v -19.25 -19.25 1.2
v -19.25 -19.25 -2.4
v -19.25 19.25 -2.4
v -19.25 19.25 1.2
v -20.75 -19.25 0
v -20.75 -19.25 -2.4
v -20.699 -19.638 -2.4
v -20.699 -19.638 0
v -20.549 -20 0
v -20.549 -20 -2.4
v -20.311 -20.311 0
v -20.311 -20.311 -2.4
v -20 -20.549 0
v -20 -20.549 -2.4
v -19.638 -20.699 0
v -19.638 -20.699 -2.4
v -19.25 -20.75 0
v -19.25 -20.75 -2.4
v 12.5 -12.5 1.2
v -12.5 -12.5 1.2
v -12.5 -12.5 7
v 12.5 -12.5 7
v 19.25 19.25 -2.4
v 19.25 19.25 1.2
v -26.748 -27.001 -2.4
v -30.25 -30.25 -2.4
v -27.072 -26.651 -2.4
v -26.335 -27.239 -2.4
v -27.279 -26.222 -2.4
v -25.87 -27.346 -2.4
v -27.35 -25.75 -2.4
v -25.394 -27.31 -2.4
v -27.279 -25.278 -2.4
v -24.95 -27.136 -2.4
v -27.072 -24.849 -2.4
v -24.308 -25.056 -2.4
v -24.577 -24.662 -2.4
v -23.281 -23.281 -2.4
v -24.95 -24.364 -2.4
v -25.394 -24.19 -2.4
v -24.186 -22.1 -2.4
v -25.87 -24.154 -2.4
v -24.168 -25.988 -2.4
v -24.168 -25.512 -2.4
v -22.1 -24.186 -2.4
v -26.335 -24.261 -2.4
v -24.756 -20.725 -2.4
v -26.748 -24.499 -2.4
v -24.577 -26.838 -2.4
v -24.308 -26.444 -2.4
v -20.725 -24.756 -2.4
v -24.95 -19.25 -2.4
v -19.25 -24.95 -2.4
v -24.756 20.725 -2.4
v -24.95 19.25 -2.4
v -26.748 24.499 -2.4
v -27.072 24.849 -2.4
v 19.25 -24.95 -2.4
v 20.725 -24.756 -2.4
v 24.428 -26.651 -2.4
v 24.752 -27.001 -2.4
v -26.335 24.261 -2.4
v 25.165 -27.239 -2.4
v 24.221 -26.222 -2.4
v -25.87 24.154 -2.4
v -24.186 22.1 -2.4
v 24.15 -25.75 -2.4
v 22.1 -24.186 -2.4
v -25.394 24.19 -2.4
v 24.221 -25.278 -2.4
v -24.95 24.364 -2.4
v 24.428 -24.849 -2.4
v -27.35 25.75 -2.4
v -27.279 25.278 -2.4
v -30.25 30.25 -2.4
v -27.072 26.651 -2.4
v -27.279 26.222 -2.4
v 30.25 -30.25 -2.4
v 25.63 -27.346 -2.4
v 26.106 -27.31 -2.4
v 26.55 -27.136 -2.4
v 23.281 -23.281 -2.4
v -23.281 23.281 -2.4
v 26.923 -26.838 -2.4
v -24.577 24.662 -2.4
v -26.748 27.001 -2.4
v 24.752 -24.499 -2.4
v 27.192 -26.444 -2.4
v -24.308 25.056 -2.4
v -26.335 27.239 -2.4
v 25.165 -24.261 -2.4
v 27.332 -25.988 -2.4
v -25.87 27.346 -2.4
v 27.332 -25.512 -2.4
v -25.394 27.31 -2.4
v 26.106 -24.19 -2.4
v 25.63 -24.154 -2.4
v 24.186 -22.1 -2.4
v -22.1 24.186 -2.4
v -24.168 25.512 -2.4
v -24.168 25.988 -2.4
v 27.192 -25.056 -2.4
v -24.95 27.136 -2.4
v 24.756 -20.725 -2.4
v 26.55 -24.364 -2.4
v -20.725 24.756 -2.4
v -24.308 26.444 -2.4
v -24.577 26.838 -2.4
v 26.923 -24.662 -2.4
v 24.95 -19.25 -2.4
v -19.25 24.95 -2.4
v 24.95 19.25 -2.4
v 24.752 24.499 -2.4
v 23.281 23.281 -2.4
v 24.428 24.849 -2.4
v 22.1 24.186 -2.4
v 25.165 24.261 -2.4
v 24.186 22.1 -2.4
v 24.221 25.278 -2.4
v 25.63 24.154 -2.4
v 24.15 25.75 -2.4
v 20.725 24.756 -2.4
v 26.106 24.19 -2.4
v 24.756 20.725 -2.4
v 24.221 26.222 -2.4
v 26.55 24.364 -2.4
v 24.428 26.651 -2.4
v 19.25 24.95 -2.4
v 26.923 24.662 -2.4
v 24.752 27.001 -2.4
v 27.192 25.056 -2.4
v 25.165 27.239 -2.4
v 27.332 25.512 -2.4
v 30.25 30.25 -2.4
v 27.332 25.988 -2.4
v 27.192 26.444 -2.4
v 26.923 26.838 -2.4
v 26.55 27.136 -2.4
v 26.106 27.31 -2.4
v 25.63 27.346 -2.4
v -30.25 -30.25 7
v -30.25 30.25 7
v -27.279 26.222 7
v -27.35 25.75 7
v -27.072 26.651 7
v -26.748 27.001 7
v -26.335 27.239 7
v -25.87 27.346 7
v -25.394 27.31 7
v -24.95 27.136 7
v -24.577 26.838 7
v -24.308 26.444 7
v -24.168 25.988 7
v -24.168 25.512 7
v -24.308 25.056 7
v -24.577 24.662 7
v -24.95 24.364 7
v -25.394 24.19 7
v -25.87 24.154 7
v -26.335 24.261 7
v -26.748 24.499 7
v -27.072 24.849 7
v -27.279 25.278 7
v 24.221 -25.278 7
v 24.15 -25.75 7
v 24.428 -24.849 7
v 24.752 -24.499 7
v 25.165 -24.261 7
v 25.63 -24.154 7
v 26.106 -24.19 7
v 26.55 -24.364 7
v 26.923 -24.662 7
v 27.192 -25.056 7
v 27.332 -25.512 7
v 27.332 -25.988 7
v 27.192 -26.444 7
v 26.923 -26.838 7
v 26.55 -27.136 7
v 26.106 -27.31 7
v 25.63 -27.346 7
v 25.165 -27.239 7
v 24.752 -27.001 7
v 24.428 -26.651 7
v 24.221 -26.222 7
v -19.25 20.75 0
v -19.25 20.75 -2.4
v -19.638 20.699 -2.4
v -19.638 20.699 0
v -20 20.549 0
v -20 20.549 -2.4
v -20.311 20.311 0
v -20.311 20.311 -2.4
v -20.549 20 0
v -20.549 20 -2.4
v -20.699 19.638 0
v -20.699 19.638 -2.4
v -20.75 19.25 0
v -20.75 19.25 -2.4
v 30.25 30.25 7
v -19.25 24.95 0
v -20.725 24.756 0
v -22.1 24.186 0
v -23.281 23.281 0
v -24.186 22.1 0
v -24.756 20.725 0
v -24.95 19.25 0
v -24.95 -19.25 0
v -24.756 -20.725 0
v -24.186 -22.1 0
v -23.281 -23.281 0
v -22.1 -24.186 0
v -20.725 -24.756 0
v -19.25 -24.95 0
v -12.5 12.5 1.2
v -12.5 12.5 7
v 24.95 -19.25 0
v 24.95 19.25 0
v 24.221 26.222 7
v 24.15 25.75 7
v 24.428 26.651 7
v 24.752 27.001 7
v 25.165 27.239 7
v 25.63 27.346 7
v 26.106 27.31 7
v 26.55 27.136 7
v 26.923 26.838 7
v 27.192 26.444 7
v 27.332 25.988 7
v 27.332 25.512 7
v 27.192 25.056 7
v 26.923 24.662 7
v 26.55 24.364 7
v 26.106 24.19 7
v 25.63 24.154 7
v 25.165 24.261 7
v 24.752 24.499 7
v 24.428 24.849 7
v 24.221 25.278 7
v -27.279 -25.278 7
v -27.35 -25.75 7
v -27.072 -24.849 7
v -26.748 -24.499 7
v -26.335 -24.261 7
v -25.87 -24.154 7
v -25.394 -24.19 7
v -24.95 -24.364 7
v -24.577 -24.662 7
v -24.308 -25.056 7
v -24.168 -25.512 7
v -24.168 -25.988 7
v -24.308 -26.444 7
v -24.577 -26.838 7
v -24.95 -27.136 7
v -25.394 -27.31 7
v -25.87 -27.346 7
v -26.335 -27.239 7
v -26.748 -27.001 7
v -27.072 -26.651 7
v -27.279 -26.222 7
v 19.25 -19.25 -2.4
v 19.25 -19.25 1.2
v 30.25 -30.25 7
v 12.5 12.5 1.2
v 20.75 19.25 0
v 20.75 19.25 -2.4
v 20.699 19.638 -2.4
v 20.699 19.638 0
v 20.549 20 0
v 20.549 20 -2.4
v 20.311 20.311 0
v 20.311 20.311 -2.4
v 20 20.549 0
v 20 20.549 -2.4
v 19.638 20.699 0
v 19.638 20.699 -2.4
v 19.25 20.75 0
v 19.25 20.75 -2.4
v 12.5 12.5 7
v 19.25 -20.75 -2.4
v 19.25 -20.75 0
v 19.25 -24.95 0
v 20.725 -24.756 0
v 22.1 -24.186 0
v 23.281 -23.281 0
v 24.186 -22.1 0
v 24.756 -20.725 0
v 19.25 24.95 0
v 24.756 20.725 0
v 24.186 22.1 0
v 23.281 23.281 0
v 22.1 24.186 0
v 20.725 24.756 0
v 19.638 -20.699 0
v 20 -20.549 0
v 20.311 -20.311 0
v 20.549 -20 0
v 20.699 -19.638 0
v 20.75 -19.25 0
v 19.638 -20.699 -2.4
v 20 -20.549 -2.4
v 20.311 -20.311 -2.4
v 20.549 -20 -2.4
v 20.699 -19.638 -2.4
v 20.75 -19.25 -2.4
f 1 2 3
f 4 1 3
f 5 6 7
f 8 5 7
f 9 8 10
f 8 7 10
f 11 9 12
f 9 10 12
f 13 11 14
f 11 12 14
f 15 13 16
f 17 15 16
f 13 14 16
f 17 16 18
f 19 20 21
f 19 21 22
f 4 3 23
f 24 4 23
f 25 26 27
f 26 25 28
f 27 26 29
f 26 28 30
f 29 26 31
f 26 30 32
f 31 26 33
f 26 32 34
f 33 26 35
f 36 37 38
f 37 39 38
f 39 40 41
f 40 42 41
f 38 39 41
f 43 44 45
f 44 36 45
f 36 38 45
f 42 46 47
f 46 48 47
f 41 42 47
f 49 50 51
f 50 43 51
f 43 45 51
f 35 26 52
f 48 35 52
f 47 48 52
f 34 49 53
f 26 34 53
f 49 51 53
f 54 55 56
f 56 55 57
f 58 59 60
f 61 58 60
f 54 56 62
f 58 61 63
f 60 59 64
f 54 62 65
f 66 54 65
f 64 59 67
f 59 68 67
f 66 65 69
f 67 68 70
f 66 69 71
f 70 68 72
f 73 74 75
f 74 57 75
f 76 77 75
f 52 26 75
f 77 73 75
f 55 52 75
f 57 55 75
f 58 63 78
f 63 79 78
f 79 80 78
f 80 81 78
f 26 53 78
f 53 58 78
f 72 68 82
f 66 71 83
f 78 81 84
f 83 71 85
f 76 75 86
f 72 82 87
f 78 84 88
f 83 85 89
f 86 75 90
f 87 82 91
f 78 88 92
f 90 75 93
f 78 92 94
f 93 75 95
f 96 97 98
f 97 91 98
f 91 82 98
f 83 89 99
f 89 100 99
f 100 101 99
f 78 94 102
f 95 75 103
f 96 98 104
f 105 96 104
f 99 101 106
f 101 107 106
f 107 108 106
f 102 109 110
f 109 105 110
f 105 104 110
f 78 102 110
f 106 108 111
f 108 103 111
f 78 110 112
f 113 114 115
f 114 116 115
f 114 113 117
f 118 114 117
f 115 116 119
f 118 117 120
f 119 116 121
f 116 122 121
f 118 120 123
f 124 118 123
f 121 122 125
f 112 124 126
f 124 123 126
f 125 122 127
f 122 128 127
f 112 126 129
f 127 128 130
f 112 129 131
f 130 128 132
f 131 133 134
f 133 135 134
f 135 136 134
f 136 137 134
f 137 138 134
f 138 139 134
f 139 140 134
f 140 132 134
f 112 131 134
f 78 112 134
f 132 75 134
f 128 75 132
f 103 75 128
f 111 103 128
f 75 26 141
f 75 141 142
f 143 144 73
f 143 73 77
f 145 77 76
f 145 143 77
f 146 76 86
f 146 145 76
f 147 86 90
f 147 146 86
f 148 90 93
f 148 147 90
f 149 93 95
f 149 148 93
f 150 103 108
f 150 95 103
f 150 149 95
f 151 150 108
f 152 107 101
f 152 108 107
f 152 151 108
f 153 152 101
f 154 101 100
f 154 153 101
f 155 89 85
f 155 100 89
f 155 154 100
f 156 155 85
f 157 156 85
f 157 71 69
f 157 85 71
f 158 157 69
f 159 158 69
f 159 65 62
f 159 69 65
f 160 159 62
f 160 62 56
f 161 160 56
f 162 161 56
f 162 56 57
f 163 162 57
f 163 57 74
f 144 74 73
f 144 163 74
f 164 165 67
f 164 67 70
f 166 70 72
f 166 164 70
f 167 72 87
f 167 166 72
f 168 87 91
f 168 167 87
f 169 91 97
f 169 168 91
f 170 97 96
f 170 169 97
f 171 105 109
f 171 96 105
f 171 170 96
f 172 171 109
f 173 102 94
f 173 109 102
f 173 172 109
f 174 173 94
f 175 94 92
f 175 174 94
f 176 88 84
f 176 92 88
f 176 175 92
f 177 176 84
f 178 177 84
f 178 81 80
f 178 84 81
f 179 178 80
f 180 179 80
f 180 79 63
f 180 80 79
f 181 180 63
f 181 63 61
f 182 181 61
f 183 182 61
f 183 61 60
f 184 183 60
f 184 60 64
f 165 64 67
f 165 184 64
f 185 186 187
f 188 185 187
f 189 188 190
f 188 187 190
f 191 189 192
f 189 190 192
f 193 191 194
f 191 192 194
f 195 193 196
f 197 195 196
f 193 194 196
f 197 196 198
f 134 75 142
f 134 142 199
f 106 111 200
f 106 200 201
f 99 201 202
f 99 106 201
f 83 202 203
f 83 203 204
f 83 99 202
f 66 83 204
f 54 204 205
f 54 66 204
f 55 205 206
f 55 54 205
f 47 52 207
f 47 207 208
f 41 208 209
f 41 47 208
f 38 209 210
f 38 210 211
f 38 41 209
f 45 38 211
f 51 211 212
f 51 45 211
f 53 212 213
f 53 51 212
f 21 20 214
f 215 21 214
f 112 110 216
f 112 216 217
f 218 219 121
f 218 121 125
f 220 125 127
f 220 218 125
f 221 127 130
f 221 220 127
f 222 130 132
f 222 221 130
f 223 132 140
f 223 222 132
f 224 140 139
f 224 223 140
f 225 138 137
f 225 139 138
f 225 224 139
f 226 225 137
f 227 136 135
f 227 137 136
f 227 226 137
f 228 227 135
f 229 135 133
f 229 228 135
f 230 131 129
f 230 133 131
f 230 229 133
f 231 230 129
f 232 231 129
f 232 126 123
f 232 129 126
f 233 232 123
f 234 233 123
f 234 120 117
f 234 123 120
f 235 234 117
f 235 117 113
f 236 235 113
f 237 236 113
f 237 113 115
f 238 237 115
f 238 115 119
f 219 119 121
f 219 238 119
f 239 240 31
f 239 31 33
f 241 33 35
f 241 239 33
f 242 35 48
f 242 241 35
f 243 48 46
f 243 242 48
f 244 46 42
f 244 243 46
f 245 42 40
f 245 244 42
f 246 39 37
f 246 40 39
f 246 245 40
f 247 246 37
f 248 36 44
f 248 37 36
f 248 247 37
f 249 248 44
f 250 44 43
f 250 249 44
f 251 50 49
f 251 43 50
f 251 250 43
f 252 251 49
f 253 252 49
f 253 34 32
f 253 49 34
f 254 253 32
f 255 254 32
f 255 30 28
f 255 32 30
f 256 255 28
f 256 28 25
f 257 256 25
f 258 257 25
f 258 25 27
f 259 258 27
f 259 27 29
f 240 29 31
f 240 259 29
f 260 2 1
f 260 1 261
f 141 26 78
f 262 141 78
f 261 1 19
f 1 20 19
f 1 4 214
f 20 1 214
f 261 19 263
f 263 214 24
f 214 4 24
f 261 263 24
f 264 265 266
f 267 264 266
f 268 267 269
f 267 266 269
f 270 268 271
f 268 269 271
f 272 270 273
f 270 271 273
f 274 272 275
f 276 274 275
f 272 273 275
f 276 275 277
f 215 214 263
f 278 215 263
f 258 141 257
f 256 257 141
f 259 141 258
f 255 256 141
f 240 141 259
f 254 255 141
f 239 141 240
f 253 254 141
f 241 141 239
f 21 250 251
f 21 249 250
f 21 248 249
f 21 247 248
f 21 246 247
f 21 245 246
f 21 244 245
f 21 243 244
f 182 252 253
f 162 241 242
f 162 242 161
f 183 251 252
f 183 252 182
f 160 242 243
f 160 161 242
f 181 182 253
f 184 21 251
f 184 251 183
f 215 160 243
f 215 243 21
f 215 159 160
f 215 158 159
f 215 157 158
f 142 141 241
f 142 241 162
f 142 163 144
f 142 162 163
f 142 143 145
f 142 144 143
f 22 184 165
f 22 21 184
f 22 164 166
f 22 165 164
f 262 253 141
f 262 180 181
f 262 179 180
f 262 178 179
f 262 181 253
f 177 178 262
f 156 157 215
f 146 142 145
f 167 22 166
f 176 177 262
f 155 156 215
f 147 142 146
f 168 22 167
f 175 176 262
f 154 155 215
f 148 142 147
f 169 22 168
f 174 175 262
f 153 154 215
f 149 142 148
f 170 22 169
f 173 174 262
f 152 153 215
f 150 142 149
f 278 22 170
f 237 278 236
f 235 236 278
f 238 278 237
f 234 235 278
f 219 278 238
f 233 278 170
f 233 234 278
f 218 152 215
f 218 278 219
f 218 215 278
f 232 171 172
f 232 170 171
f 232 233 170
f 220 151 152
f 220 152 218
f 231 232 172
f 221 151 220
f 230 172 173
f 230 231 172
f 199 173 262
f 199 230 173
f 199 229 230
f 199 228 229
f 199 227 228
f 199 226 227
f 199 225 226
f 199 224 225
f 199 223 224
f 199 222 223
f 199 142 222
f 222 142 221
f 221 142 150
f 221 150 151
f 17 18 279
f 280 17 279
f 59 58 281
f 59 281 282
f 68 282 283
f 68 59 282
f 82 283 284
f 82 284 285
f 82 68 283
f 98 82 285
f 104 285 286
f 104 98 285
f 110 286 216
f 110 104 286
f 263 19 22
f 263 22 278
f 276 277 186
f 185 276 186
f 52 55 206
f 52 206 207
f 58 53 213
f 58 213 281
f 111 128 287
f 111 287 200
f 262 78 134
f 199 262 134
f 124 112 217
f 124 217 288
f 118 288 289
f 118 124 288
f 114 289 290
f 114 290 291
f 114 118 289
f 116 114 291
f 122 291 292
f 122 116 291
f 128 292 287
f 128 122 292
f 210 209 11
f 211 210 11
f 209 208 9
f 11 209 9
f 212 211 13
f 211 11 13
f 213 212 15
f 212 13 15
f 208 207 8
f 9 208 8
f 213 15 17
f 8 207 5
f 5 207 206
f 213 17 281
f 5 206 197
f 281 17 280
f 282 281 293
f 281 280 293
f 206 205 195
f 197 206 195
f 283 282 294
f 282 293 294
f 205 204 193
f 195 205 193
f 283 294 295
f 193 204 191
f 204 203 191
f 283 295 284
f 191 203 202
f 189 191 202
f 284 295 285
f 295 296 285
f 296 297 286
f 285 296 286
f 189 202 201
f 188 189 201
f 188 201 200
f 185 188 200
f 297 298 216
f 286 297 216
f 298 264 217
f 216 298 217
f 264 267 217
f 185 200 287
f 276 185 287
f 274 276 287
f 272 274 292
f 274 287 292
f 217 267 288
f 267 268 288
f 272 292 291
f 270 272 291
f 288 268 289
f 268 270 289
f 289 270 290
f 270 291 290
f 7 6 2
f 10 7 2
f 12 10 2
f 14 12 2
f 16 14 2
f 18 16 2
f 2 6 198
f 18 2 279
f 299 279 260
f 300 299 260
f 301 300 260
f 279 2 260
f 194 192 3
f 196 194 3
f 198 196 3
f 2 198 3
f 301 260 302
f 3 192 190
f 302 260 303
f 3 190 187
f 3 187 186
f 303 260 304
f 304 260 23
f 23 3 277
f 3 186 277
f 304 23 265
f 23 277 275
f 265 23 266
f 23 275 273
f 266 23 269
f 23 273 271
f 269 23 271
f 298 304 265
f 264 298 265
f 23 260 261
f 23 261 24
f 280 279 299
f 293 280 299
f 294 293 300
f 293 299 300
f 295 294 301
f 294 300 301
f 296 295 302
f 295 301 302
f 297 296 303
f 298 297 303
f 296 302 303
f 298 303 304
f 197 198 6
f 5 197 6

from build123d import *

# Parameters (mm, degrees)
EXTRUDE_1_DEPTH          = 7
EXTRUDE_1_DEPTH_BACK     = 2.4
SKETCH_1_W               = 60.5
SKETCH_1_H               = 60.5
SKETCH_1_W_2             = 38.5
SKETCH_1_H_2             = 38.5
SKETCH_2_W               = 38.5
SKETCH_2_H               = 38.5
SKETCH_2_W_2             = 25
SKETCH_2_H_2             = 25
EXTRUDE_3_DEPTH          = 5.8
CUT_EXTRUDE_1_DEPTH      = 2.4
CUT_EXTRUDE_2_DEPTH      = 44.800513696
CUT_EXTRUDE_2_DEPTH_BACK = 44.800513696
SKETCH_5_R               = 1.6


with BuildPart() as part:
    # ｽｹｯﾁ1 → ﾎﾞｽ - 押し出し1 (new, two sides: drawn at the far end of the back side and taken through both)
    with BuildSketch(Plane.XY.offset(-EXTRUDE_1_DEPTH_BACK)):
        Rectangle(SKETCH_1_W, SKETCH_1_H)
        Rectangle(SKETCH_1_W_2, SKETCH_1_H_2, mode=Mode.SUBTRACT)
    extrude(amount=EXTRUDE_1_DEPTH + EXTRUDE_1_DEPTH_BACK)

    # ｽｹｯﾁ2 → ﾎﾞｽ - 押し出し3 (add)
    with BuildSketch(Plane.XY.offset(1.2)):
        Rectangle(SKETCH_2_W, SKETCH_2_H)
        Rectangle(SKETCH_2_W_2, SKETCH_2_H_2, mode=Mode.SUBTRACT)
    extrude(amount=EXTRUDE_3_DEPTH)

    # ｽｹｯﾁ3 → ｶｯﾄ - 押し出し1 (cut)
    with BuildSketch(Plane(origin=(0, 0, -2.4), x_dir=(-1, 0, 0), z_dir=(0, 0, -1))):
        with BuildLine():
            ThreePointArc((-24.95, 19.25), (-23.280508653, 23.280508653), (-19.25, 24.95))
            Line((-19.25, 24.95), (19.25, 24.95))
            ThreePointArc((19.25, 24.95), (23.280508653, 23.280508653), (24.95, 19.25))
            Line((24.95, 19.25), (24.95, -19.25))
            ThreePointArc((24.95, -19.25), (23.280508653, -23.280508653), (19.25, -24.95))
            Line((19.25, -24.95), (-19.25, -24.95))
            ThreePointArc((-19.25, -24.95), (-23.280508653, -23.280508653), (-24.95, -19.25))
            Line((-24.95, -19.25), (-24.95, 19.25))
        make_face()
        with BuildLine():
            Line((-20.75, -19.25), (-20.75, 19.25))
            ThreePointArc((-20.75, 19.25), (-20.310660172, 20.310660172), (-19.25, 20.75))
            Line((-19.25, 20.75), (19.25, 20.75))
            ThreePointArc((19.25, 20.75), (20.310660172, 20.310660172), (20.75, 19.25))
            Line((20.75, 19.25), (20.75, -19.25))
            ThreePointArc((20.75, -19.25), (20.310660172, -20.310660172), (19.25, -20.75))
            Line((19.25, -20.75), (-19.25, -20.75))
            ThreePointArc((-19.25, -20.75), (-20.310660172, -20.310660172), (-20.75, -19.25))
        make_face(mode=Mode.SUBTRACT)
    extrude(amount=-CUT_EXTRUDE_1_DEPTH, mode=Mode.SUBTRACT)

    # ｽｹｯﾁ5 → ｶｯﾄ - 押し出し2 (cut, two sides: drawn at the far end of the back side and taken through both)
    with BuildSketch(Plane(origin=(0, 0, -2.4), x_dir=(-1, 0, 0), z_dir=(0, 0, -1)).offset(-CUT_EXTRUDE_2_DEPTH_BACK)):
        with Locations((-25.75, 25.75)):
            Circle(SKETCH_5_R)
        with Locations((25.75, 25.75)):
            Circle(SKETCH_5_R)
        with Locations((25.75, -25.75)):
            Circle(SKETCH_5_R)
        with Locations((-25.75, -25.75)):
            Circle(SKETCH_5_R)
    extrude(amount=CUT_EXTRUDE_2_DEPTH + CUT_EXTRUDE_2_DEPTH_BACK, mode=Mode.SUBTRACT)


solid = part.part
